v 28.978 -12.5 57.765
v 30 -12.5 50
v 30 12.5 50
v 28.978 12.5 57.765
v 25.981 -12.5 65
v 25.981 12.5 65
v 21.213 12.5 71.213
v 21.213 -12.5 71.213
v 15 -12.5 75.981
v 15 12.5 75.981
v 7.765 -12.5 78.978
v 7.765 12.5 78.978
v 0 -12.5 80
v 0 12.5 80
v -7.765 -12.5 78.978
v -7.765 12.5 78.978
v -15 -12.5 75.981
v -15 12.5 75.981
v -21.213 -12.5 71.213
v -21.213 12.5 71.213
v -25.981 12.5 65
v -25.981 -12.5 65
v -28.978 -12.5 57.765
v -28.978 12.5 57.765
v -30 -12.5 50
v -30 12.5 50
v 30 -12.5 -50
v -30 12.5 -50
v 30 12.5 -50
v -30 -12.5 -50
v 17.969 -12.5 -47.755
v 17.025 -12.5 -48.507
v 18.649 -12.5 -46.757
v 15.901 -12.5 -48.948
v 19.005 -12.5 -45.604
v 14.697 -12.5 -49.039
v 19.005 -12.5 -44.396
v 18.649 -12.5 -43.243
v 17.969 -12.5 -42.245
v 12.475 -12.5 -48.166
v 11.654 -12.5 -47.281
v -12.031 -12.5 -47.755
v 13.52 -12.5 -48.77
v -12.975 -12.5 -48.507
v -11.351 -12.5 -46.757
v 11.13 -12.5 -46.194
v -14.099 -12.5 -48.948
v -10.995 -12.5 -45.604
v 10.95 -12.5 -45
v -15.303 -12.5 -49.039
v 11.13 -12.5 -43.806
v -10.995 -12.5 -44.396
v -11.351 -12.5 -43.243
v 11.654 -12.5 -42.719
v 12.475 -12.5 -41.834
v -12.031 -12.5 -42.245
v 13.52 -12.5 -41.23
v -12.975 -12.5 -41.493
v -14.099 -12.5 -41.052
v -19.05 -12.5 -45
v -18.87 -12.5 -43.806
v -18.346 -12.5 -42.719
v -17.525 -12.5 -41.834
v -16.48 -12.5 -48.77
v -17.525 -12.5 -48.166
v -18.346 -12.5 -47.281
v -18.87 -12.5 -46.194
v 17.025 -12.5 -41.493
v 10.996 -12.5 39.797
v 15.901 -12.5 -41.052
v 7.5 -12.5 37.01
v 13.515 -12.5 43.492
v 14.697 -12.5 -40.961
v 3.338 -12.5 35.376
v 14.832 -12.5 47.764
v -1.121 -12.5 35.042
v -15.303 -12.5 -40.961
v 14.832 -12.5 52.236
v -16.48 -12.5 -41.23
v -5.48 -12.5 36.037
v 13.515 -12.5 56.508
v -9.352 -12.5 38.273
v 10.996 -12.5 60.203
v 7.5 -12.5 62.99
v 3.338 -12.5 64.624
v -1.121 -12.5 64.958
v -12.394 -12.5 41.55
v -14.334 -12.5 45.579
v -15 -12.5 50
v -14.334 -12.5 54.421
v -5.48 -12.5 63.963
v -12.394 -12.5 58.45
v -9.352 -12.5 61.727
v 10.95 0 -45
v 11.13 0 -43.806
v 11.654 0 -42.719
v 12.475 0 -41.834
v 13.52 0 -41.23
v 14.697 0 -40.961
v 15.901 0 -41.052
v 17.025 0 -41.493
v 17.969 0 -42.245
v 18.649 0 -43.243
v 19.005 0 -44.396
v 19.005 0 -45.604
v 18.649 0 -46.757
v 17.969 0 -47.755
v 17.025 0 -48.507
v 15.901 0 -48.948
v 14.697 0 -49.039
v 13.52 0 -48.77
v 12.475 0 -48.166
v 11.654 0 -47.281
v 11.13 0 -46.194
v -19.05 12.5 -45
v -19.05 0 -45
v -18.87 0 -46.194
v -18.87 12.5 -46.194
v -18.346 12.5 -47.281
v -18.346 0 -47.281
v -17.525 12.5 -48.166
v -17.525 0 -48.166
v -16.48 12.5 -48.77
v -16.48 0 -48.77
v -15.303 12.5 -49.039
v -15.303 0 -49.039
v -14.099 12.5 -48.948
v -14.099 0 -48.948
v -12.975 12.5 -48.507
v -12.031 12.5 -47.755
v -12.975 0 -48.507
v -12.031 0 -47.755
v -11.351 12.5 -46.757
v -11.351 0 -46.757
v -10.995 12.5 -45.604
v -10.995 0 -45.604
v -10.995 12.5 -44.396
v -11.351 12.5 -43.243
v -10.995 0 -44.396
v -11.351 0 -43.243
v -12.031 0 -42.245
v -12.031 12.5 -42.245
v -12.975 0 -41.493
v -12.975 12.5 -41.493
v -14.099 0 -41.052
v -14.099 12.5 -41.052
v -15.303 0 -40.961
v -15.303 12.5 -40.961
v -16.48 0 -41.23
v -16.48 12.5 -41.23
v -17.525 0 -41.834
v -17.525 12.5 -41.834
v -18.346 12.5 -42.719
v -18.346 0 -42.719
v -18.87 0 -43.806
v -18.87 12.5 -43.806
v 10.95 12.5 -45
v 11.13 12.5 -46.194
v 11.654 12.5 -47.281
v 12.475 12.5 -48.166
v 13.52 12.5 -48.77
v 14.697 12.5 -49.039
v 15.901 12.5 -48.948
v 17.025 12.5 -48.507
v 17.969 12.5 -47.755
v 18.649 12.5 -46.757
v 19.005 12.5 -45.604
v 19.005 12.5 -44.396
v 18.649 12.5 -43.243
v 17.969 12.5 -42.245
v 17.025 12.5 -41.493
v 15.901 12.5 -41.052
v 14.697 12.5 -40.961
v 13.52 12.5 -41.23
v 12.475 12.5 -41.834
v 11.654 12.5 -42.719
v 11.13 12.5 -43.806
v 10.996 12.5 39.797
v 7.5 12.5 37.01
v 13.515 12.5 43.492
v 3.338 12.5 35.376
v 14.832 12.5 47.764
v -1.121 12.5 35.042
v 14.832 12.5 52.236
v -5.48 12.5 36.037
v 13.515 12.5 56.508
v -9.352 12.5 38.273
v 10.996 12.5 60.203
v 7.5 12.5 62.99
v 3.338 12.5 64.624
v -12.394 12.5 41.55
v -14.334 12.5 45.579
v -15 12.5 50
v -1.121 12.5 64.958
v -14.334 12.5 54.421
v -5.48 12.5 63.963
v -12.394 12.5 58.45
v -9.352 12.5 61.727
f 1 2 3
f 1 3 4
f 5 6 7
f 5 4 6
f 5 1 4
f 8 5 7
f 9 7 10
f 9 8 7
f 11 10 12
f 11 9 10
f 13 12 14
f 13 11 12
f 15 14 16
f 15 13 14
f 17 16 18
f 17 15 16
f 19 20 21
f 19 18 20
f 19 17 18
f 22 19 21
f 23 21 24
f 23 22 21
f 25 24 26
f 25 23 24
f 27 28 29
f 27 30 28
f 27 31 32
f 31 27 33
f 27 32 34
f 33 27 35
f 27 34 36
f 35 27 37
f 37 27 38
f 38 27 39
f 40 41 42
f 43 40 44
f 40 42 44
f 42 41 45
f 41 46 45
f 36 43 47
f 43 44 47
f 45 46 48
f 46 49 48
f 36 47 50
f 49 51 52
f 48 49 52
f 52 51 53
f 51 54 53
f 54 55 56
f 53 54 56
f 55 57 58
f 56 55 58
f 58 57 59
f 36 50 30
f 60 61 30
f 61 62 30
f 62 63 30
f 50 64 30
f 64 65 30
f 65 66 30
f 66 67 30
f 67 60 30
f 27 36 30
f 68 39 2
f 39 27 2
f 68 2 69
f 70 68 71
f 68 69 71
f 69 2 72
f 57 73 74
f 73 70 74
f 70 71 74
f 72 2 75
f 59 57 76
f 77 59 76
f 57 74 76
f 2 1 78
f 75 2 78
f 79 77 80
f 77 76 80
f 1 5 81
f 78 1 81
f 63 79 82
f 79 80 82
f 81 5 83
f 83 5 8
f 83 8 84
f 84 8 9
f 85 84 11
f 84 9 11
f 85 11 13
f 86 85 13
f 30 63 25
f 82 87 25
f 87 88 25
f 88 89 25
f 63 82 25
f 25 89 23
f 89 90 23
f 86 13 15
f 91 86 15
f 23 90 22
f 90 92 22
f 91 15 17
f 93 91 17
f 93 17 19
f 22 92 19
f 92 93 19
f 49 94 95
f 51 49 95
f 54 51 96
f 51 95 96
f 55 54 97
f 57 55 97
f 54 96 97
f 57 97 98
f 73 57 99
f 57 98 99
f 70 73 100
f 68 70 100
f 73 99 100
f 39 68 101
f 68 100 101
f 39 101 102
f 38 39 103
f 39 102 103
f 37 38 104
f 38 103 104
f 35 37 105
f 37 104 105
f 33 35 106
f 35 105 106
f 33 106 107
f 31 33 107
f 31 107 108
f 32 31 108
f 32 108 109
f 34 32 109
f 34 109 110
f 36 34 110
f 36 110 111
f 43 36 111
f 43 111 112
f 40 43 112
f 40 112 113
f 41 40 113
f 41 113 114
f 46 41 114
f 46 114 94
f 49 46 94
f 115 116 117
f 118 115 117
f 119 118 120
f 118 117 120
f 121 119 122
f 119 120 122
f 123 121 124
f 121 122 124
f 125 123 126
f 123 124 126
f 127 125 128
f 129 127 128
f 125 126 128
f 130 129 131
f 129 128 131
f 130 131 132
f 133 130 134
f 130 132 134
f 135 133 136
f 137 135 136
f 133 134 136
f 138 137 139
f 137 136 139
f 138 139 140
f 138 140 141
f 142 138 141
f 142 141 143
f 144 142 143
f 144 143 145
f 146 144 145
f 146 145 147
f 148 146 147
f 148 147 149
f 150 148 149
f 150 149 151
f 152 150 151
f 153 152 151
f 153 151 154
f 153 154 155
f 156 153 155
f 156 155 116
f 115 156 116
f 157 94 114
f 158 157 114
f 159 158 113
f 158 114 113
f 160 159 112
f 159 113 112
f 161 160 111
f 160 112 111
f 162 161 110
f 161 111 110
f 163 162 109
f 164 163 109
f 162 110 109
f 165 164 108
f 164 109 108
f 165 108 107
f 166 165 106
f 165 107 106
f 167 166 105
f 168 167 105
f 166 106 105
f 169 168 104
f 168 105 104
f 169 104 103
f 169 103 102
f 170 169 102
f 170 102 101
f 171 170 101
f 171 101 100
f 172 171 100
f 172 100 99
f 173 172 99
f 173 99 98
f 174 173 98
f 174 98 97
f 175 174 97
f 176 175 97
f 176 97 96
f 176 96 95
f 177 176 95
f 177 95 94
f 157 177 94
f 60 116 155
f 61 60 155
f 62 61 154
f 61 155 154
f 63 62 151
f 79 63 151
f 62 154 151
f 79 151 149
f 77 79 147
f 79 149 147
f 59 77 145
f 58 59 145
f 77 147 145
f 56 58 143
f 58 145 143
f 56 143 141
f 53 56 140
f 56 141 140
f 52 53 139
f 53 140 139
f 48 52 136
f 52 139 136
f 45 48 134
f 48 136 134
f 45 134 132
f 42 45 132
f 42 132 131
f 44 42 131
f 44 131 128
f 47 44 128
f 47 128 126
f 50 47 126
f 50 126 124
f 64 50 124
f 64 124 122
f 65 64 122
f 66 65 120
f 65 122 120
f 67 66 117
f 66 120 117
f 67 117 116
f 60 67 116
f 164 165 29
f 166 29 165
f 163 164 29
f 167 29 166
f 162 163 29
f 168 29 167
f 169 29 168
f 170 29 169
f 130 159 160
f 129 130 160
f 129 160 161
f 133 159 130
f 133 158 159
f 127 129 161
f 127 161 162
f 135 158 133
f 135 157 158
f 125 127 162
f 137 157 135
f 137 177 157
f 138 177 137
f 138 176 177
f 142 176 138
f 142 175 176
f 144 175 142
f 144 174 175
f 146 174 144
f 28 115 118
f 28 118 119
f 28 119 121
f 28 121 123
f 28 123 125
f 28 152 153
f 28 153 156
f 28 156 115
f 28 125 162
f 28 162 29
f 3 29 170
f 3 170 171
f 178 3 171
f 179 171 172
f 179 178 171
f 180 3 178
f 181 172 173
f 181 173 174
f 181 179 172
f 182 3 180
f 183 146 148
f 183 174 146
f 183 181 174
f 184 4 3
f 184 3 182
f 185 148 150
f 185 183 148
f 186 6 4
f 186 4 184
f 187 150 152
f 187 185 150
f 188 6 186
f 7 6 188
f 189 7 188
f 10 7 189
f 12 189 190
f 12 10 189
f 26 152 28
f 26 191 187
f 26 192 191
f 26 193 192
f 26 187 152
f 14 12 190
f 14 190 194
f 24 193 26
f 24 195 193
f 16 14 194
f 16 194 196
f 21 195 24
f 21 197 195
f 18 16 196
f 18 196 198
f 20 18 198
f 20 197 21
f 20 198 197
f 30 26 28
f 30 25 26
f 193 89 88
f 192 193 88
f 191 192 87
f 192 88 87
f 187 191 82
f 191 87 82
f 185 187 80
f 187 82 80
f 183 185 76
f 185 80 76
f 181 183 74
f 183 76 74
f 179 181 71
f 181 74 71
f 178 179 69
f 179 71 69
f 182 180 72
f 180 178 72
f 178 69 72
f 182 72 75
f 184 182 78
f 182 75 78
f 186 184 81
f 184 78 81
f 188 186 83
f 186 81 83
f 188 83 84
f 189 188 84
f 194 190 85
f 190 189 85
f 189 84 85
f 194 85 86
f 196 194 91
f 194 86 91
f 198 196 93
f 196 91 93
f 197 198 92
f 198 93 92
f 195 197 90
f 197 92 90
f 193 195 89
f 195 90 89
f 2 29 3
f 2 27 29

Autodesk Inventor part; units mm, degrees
ref_plane "YZ Plane" through (0, 0, 0) normal (1, 0, 0) x (0, 1, 0)
ref_plane "XZ Plane" through (0, 0, 0) normal (0, 1, 0) x (-1, 0, 0)
ref_plane "XY Plane" through (0, 0, 0) normal (0, 0, 1) x (1, 0, 0)
sketch "Sketch1" plane through (0, 0, 0) normal (0, 1, 0) x (-1, 0, 0)
  line L0 (30, -50) -> (-30, -50)
  line L1 (-30, -50) -> (-30, 50)
  arc A0 (30, 50) -> (-30, 50) centre (0, 50) ccw
  line L2 (30, 50) -> (30, -50)
  circle A1 centre (0, 50) radius 15
  point P0 (0, 0)
  point P1 (30, 0)
  dimension "d0" = 60
  dimension "d1" = 100
  dimension "d2" = 30
extrude "Extrusion1" add sketch "Sketch1" along normal mid plane 25
sketch "Sketch2" plane through (0, 0, 0) normal (0, 1, 0) x (-1, 0, 0)
  line L0 (-30, -50) -> (-30, 50) construction
  arc A0 (30, 50) -> (-30, 50) centre (0, 50) ccw construction
  line L1 (30, 50) -> (30, -50) construction
  line L2 (30, -50) -> (-30, -50) construction
  circle A1 centre (0, 50) radius 15 construction
  line L3 (30, 50) -> (30, -50) construction
  line L4 (30, -40) -> (-30, -40) construction
  line L5 (-30, -50) -> (-30, 50) construction
  line L6 (0, -40) -> (0, -50) construction
  circle A2 centre (15, -45) radius 4.05
  circle A3 centre (-15, -45) radius 4.05
  point P0 (0, 0)
  point P1 (0, -45)
  dimension "d5" = 10
  dimension "d6" = 8.1
  dimension "d7" = 30
extrude "Extrusion2" cut sketch "Sketch2" along normal through all both and the other way through all
properties part number "element2_obj4"
